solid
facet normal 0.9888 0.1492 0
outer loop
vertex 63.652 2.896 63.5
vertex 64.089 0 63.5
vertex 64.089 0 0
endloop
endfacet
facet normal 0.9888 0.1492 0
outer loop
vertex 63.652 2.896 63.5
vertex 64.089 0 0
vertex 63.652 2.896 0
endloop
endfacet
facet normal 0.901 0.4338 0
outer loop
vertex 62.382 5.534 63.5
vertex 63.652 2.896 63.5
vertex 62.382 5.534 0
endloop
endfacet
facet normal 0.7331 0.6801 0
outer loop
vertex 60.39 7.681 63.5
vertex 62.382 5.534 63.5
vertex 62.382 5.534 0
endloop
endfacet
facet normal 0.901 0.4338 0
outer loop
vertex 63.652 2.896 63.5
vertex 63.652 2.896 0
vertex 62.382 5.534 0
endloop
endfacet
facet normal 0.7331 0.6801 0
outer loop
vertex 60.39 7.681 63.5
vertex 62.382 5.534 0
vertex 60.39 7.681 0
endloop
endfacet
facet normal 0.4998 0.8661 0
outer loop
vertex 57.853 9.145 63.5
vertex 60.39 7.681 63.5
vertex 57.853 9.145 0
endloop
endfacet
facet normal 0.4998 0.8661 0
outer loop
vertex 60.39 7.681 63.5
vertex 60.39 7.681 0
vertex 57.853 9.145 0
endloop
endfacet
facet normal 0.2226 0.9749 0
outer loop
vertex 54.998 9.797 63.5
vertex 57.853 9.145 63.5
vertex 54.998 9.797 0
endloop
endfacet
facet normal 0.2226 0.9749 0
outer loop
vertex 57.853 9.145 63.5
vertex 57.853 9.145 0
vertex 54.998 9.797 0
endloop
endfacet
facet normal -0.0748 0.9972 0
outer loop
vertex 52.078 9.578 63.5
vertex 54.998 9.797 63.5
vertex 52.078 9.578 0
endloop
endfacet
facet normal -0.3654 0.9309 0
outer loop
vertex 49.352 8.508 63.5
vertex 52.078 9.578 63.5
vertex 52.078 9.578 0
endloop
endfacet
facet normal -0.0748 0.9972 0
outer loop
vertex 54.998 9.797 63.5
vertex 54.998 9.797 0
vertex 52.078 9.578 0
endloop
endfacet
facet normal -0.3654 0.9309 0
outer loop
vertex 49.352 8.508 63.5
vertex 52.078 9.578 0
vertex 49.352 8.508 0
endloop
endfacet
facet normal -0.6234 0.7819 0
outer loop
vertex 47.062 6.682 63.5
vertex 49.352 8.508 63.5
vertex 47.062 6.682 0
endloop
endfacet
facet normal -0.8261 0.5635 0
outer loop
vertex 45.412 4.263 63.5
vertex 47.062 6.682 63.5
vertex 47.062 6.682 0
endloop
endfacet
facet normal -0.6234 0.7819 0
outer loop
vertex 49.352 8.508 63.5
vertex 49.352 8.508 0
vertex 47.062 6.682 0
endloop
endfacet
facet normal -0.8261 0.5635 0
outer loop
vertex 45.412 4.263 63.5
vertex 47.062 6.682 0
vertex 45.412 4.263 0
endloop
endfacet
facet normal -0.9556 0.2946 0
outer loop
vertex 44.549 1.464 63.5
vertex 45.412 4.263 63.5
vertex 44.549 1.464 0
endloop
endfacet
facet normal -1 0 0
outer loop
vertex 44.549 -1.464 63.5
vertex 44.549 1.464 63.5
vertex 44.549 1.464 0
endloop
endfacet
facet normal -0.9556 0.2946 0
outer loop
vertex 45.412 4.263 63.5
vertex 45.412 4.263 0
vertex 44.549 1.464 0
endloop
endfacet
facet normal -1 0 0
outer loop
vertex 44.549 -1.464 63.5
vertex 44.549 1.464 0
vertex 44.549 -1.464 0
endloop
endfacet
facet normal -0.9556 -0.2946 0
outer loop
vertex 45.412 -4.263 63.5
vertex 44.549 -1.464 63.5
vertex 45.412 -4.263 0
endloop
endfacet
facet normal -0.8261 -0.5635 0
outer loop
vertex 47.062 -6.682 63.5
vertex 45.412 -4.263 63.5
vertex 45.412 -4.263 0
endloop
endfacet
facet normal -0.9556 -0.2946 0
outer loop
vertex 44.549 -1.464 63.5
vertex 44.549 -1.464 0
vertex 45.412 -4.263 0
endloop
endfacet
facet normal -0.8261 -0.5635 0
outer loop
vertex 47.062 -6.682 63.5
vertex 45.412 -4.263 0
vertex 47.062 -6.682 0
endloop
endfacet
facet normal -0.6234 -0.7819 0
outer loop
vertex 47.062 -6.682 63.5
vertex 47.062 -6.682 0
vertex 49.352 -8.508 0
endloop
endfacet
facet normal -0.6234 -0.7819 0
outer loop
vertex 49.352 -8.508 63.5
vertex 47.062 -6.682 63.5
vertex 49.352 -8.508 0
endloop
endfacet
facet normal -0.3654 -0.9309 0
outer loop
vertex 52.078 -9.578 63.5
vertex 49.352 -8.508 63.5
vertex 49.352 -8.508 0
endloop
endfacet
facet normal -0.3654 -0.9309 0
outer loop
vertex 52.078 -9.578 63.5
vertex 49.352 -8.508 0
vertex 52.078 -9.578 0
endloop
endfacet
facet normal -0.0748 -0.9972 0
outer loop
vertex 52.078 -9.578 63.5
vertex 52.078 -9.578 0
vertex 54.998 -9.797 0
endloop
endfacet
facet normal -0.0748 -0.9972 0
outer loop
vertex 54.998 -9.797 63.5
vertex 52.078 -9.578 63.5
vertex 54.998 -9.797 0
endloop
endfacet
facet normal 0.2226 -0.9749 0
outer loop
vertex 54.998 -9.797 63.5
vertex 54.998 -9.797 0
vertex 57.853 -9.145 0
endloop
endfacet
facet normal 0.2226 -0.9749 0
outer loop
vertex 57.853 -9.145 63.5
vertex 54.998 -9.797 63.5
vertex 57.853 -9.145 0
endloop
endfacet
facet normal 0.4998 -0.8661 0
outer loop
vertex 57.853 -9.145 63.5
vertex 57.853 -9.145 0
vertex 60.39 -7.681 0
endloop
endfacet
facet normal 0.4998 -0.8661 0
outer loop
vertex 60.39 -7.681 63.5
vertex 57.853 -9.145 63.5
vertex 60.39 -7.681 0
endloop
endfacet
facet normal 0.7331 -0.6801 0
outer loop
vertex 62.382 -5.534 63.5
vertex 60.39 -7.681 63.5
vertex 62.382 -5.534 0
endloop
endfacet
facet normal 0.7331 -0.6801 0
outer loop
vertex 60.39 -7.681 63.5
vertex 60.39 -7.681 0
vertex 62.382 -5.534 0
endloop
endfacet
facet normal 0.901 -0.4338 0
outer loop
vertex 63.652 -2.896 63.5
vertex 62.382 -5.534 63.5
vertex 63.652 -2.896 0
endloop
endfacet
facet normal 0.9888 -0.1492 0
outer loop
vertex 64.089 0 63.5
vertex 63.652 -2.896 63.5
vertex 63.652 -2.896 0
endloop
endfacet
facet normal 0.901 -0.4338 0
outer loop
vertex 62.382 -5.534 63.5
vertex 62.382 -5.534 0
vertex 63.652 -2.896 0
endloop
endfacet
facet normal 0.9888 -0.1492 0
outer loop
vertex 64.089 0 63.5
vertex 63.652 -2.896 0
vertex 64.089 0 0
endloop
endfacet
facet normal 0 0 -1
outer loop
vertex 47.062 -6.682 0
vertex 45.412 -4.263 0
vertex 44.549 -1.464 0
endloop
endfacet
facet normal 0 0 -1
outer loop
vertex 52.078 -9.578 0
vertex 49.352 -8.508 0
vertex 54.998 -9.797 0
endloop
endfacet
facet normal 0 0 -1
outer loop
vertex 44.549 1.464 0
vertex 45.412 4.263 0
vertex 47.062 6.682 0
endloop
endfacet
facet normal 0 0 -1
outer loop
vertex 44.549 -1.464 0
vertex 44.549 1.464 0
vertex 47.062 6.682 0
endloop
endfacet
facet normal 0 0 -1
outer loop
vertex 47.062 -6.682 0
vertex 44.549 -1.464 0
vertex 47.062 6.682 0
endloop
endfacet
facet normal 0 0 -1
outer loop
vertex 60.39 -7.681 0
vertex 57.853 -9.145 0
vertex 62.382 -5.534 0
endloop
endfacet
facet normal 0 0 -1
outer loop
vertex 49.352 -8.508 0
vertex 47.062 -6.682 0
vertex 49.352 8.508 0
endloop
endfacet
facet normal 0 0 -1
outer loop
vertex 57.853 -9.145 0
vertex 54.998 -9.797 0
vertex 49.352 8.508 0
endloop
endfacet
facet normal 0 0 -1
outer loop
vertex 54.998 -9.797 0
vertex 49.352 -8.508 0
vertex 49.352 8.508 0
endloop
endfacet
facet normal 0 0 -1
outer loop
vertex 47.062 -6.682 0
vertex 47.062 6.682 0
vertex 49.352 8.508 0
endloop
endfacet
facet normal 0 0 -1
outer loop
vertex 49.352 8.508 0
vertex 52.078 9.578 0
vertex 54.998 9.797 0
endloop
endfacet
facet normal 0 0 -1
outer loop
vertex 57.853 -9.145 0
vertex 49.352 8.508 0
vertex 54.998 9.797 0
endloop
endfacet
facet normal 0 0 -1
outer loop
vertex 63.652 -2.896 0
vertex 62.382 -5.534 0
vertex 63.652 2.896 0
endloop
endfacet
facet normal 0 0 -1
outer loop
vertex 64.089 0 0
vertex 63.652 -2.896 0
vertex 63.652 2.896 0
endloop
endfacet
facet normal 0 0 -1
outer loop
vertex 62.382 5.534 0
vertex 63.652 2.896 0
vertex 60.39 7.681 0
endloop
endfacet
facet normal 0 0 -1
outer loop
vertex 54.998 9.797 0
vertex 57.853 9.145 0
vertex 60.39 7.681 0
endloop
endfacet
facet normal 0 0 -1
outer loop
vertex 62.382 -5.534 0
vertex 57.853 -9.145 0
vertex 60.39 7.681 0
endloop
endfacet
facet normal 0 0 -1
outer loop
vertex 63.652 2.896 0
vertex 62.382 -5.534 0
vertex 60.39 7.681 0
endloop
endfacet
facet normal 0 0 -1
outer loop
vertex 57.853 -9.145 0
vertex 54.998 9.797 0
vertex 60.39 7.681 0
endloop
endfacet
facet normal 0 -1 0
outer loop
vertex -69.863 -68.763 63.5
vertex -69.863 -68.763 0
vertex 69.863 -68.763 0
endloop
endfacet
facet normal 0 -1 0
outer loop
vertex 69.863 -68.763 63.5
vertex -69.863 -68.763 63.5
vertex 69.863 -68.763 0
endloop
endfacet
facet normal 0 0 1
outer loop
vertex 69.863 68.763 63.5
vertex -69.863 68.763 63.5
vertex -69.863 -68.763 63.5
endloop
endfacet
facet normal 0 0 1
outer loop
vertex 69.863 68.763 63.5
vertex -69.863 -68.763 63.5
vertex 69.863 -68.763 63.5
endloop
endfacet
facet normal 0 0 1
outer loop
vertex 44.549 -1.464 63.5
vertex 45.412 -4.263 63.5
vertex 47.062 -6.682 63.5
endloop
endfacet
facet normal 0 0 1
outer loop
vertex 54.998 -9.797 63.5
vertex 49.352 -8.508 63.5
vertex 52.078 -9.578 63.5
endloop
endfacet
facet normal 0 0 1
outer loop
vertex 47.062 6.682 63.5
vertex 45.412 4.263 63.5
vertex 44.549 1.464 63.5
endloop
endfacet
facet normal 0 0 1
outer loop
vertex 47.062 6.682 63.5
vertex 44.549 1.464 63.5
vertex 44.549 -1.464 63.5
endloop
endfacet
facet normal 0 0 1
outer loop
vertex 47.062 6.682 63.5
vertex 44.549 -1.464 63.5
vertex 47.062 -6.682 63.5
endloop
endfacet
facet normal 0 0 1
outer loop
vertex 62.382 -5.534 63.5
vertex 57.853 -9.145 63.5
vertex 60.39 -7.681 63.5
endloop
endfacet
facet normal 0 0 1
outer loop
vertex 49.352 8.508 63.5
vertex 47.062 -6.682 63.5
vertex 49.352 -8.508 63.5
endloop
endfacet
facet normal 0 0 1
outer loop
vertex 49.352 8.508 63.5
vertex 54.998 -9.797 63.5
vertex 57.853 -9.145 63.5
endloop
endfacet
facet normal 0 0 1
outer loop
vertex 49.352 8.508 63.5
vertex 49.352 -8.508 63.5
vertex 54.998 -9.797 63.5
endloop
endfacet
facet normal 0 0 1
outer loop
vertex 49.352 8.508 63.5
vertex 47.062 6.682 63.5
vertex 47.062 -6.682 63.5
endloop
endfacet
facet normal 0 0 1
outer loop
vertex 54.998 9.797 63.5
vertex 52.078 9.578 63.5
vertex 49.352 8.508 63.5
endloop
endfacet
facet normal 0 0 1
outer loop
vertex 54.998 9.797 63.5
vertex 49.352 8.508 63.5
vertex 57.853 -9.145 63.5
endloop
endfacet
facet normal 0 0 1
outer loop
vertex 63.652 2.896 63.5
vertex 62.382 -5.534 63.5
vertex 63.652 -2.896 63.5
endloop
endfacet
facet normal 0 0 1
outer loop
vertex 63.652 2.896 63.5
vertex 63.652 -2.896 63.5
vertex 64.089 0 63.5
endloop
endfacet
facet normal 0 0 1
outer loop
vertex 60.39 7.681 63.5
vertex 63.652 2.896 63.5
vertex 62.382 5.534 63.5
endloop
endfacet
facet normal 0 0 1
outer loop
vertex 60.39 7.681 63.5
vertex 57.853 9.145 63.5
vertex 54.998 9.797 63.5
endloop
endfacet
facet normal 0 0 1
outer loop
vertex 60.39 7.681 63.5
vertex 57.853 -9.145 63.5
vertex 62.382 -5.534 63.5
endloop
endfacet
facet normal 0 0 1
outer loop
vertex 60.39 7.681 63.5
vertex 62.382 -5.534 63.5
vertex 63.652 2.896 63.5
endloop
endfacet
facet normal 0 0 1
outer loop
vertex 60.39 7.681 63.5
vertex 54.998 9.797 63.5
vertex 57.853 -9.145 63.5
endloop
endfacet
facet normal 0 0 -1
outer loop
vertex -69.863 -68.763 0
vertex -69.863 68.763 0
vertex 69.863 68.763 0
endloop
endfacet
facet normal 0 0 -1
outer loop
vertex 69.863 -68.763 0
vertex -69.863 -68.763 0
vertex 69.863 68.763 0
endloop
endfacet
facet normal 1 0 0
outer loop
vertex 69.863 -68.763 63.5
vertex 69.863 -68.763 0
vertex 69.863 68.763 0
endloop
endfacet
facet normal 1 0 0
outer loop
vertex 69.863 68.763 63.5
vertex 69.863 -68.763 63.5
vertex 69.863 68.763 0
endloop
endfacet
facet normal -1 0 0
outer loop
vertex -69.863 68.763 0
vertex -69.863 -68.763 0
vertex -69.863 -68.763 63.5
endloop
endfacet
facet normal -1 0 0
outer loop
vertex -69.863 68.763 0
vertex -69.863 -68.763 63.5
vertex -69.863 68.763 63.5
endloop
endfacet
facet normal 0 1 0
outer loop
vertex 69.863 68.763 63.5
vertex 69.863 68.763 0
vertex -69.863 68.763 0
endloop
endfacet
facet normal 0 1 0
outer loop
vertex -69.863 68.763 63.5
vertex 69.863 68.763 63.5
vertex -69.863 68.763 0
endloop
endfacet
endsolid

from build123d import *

# Parameters (mm, degrees)
F1_R     = 9.8246353949
F2_DEPTH = 63.5
F0_W     = 69.8630958796
F0_H     = 137.5265717506


# Not quite as in the source:
# - the program builds the solid bodies; features that only make, move or delete a surface that nothing else refers to are left out


with BuildPart() as f2:
    # F1 (on Top) → F2 (new body)
    with BuildSketch(Plane.XY):
        with Locations((54.2640089989, 0)):
            Circle(F1_R)
    extrude(amount=F2_DEPTH)


with BuildPart() as f2b:
    # F0 (on Top) → F2, piece 2 (new body)
    with BuildSketch(Plane.XY):
        with Locations((34.9315479398, 0)):
            Rectangle(F0_W, F0_H)
        with Locations((-34.9315479398, 0)):
            Rectangle(F0_W, F0_H)
    extrude(amount=F2_DEPTH)


solid = Compound([f2.part, f2b.part])
